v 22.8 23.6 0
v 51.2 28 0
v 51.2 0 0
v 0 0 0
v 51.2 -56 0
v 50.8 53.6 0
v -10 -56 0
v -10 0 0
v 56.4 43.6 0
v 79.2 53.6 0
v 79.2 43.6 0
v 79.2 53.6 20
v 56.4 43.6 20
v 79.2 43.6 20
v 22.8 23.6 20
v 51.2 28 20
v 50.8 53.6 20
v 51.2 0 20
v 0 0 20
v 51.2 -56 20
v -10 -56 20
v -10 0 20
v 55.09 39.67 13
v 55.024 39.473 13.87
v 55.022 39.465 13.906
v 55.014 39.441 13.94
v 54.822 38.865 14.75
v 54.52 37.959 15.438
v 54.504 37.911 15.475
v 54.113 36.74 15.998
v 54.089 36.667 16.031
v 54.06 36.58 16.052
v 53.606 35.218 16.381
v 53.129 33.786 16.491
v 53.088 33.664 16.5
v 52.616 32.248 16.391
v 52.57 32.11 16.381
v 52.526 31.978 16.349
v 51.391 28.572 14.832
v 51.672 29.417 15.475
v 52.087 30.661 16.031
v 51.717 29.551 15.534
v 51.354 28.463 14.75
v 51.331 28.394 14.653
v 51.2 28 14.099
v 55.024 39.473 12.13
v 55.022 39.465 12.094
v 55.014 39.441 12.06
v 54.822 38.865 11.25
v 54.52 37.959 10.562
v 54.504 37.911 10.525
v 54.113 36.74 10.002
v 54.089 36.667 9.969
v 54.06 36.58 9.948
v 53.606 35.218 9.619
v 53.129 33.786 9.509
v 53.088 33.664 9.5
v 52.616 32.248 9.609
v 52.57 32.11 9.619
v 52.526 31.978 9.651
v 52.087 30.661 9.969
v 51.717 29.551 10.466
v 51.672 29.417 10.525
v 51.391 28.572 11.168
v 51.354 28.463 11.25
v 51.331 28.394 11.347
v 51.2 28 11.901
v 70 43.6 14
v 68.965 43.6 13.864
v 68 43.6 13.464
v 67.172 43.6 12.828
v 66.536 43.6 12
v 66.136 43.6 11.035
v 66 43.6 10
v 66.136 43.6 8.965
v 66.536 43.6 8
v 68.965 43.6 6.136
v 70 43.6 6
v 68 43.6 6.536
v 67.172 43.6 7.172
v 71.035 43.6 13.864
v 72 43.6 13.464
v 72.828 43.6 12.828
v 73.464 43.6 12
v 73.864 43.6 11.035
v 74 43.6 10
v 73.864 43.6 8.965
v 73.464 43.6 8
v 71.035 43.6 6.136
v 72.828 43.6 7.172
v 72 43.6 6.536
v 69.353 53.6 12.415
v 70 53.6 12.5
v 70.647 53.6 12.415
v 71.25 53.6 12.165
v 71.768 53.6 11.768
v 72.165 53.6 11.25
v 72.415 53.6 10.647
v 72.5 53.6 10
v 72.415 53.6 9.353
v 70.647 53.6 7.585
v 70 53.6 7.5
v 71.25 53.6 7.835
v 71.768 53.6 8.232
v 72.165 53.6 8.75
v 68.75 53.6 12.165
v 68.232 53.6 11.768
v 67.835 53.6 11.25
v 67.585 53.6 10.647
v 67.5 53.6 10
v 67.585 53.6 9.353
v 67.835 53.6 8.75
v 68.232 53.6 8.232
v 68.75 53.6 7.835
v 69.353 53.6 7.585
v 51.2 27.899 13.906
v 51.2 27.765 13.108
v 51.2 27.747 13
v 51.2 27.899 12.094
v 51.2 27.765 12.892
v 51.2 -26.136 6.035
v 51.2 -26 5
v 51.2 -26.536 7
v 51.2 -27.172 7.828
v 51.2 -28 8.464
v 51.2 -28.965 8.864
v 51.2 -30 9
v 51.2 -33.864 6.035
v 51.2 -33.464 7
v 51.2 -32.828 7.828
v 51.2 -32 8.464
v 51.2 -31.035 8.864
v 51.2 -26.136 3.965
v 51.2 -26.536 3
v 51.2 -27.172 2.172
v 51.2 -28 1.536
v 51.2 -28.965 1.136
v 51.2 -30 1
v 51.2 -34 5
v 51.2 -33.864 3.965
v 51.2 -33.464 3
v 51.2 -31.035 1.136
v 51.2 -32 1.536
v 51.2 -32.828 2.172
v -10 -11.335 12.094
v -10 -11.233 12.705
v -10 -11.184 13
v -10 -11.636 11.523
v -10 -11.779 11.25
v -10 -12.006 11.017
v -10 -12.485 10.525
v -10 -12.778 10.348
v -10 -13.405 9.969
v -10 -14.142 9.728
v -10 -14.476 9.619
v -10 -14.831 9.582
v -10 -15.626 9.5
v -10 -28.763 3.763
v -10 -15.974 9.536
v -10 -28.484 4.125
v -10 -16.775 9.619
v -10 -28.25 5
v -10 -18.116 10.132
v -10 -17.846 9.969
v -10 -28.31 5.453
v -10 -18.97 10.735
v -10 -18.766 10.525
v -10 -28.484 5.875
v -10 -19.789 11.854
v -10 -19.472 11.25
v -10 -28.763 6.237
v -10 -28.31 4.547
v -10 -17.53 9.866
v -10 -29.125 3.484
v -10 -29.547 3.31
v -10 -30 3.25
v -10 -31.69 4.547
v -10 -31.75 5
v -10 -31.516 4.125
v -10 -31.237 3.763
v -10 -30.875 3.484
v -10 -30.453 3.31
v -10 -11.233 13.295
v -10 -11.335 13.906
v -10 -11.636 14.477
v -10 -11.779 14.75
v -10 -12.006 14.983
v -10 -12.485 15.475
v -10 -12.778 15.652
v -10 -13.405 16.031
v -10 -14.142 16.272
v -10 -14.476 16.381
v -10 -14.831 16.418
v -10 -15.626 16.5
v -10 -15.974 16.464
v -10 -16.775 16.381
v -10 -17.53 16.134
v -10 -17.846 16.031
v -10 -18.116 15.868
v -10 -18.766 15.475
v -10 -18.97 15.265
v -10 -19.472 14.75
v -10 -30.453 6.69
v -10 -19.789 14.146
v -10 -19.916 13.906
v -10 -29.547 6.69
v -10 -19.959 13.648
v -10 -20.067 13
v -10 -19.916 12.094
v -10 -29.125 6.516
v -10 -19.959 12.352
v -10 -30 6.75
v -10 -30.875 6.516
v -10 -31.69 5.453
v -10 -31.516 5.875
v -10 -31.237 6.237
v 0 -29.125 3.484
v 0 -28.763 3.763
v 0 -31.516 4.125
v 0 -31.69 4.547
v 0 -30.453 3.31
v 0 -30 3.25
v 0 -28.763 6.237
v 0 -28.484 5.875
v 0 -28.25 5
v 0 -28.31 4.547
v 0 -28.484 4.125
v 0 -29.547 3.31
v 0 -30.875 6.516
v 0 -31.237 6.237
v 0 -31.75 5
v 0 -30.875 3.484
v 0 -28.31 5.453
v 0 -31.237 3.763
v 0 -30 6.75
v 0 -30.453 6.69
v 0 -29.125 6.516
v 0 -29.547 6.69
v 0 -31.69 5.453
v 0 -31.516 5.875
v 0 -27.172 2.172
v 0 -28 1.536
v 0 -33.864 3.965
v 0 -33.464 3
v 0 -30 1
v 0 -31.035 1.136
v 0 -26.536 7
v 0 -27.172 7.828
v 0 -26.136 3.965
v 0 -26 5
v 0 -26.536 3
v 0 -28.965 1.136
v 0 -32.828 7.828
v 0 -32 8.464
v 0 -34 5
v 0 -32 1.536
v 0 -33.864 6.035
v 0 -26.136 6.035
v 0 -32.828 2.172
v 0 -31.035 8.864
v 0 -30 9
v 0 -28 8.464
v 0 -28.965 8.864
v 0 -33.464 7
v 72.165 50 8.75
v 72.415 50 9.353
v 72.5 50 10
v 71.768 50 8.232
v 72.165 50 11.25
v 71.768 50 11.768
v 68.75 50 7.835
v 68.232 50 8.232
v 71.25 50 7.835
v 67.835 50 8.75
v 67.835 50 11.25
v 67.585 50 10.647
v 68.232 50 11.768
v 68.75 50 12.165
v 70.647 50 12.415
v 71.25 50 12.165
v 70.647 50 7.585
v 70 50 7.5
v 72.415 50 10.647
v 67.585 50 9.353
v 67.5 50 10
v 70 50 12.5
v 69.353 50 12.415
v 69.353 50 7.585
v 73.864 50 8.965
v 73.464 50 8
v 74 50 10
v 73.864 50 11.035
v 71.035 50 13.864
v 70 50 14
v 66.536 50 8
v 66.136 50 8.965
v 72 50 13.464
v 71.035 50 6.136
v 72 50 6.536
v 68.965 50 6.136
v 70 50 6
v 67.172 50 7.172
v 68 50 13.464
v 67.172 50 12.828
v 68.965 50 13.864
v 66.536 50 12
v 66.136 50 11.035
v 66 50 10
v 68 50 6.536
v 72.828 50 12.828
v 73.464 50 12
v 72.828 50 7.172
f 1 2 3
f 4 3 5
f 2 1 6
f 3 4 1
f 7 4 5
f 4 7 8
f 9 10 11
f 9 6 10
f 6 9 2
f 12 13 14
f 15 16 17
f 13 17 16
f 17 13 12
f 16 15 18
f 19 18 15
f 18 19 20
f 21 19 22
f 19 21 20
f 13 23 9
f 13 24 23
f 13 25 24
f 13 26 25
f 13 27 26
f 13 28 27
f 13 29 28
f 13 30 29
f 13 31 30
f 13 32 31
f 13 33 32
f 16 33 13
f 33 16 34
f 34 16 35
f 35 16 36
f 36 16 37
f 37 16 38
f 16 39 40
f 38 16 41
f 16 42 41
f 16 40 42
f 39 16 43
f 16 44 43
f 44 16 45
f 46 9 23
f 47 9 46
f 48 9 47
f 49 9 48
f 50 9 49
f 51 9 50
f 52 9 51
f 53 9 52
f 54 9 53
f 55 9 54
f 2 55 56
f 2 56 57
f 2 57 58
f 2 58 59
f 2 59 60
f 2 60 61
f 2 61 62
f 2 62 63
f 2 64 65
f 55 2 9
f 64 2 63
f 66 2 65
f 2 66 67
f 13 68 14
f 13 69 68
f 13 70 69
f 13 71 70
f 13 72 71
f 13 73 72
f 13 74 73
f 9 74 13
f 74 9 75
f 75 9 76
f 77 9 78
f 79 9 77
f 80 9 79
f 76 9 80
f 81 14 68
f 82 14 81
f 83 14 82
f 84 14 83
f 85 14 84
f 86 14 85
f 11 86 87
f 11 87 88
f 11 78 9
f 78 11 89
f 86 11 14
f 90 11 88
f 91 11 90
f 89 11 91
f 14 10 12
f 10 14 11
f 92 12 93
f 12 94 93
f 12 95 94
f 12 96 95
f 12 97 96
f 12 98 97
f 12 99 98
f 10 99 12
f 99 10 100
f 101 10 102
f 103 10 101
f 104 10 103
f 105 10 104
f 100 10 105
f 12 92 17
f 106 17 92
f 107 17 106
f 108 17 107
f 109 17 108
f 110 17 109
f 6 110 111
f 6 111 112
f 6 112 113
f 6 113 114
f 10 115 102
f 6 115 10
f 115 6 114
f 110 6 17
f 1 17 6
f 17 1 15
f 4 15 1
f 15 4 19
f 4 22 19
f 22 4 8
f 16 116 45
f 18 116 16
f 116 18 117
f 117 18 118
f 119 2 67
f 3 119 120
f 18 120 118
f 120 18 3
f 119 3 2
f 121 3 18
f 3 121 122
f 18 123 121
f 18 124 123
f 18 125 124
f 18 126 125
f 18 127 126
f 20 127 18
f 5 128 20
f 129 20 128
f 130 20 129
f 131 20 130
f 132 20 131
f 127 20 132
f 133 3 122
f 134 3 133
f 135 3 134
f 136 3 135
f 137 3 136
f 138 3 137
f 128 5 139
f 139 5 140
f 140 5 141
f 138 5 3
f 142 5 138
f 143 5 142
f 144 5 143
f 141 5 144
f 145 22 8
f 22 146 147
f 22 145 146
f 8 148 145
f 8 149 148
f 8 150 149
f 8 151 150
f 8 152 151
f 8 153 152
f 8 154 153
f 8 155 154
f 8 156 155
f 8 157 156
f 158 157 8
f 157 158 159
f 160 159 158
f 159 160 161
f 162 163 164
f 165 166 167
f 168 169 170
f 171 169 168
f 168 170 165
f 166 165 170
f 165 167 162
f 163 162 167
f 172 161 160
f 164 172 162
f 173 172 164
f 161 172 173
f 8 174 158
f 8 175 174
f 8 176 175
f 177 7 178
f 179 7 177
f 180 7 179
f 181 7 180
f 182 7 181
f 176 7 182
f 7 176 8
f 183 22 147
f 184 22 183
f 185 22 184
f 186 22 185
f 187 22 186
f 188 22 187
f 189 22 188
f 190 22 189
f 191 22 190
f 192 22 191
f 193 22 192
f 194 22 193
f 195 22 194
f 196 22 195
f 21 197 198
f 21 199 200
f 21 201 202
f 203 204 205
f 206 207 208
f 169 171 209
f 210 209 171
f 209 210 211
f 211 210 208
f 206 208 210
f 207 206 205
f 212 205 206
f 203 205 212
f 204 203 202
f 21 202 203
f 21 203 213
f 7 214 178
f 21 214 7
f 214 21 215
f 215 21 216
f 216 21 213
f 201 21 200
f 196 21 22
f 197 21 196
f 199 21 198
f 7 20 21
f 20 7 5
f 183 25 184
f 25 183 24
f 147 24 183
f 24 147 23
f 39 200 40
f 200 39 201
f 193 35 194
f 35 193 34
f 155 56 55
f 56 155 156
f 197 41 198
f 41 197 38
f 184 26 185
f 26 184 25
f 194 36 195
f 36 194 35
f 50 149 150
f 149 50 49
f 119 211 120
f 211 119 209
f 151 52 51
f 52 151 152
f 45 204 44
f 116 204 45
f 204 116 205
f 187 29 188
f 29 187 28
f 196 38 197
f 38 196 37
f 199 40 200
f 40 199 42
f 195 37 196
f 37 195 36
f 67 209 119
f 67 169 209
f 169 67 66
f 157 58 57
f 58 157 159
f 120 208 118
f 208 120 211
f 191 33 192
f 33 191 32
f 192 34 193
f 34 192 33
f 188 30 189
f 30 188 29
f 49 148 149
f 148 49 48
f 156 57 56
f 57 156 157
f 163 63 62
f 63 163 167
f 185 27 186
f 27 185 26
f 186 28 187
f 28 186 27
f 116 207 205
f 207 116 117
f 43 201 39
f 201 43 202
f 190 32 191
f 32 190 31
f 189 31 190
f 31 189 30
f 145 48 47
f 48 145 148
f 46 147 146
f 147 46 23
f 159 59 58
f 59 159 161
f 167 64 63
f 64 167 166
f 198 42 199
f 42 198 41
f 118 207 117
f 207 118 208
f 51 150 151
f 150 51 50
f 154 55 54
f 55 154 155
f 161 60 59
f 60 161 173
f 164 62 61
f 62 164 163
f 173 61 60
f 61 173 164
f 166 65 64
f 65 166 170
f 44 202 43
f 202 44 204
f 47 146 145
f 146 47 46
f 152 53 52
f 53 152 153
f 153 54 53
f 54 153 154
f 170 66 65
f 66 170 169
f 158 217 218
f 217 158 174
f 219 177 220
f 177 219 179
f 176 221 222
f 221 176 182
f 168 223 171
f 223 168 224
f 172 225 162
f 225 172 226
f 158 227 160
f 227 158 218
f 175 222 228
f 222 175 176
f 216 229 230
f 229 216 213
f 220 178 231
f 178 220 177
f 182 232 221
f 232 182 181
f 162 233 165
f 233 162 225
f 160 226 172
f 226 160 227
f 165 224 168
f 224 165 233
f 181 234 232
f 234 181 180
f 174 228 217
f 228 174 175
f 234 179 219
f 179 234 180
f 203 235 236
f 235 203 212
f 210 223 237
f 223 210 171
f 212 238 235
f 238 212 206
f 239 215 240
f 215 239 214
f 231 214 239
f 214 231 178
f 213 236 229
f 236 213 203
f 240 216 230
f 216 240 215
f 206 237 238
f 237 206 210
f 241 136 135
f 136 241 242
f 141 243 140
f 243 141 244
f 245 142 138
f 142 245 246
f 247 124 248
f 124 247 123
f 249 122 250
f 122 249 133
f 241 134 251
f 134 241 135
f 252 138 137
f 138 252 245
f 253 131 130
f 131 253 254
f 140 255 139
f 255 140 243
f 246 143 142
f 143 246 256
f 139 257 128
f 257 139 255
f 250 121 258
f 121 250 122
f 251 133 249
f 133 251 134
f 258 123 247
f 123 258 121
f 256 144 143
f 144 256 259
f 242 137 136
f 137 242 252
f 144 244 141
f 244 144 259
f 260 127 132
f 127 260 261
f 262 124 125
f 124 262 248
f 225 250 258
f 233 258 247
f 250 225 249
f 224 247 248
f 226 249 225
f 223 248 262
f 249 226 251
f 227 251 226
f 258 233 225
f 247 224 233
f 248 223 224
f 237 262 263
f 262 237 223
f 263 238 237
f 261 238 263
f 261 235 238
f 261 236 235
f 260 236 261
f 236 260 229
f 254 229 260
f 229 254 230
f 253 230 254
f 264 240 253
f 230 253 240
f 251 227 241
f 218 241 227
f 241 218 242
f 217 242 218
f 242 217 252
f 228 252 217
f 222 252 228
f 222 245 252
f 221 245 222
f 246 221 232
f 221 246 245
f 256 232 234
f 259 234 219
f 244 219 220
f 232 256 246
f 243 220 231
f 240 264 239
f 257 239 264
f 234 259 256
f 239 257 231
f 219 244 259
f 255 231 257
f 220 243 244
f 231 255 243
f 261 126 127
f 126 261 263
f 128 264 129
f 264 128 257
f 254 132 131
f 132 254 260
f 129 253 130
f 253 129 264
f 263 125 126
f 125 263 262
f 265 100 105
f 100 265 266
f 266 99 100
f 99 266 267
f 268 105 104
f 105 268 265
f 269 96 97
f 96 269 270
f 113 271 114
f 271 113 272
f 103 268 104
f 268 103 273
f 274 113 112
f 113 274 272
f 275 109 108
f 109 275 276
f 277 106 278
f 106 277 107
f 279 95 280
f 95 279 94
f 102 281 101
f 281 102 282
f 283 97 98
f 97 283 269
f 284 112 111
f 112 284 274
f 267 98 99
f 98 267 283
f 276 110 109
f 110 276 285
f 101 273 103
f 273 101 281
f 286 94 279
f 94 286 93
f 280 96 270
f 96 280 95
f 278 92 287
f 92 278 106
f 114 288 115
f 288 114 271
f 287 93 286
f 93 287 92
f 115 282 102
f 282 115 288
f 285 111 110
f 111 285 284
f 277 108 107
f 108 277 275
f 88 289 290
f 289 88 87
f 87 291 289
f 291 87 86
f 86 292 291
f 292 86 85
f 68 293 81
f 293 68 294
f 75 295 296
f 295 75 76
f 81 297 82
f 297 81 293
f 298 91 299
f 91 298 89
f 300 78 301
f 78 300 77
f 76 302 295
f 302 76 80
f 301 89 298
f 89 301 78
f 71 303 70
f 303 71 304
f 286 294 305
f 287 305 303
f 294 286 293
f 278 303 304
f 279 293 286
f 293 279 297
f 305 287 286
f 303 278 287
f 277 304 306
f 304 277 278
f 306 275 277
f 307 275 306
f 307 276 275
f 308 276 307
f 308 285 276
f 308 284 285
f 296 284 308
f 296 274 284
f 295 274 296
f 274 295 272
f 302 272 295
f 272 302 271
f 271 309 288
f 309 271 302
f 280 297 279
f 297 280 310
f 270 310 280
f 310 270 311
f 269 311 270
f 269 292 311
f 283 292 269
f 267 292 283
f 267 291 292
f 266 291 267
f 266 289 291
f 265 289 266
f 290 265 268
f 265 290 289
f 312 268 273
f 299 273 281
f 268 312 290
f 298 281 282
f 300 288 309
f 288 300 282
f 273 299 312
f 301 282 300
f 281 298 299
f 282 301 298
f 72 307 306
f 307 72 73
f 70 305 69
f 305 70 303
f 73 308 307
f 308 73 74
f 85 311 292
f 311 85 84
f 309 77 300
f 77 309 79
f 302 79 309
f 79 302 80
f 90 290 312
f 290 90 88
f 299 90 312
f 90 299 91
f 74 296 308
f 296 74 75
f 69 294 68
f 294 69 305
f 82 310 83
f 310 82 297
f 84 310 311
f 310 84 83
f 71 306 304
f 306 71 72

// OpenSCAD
difference(){
union(){    
scale([2,2,2])
linear_extrude(height=10)
polygon([[25.6,-10],[25.6,14],[28.2,21.8],[39.6,21.8],[39.6,26.8],[25.4,26.8],[11.4,11.8],[0,0],[-4,0],[-4,-10]]);
translate([-10,-56,0])cube([61.2,56,20]);    
}    
translate([10,0,13])rotate([0,0,128])
rotate([90,0,0])cylinder(d=7,h=130,$fn=24,center=true);
translate([-40,-30,5])rotate([0,90,0])
cylinder(d=3.5,h=200,$fn=24);
translate([0,-30,5])rotate([0,90,0])
cylinder(d=8,h=200,$fn=24);
translate([70,0,10])rotate([-90,0,0])
cylinder(d=5,h=200,$fn=24);
translate([70,0,10])rotate([-90,0,0])
cylinder(d=8,h=50,$fn=24);
}
